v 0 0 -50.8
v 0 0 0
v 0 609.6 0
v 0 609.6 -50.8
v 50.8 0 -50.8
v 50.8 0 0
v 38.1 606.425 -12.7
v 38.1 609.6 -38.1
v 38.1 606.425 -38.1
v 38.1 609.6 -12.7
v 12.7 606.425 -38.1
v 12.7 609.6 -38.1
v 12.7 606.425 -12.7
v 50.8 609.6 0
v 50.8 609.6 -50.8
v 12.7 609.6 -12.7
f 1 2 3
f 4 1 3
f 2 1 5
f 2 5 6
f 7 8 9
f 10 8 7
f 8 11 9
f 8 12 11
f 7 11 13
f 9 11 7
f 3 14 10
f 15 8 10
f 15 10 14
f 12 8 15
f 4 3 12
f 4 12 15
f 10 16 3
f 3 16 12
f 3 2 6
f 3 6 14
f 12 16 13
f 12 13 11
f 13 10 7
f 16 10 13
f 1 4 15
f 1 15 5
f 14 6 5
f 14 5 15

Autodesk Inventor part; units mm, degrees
ref_plane "YZ Plane" through (0, 0, 0) normal (1, 0, 0) x (0, 1, 0)
ref_plane "XZ Plane" through (0, 0, 0) normal (0, 1, 0) x (-1, 0, 0)
ref_plane "XY Plane" through (0, 0, 0) normal (0, 0, 1) x (1, 0, 0)
sketch "Sketch1" plane through (0, 0, 0) normal (1, 0, 0) x (0, 1, 0)
  line L0 (0, 0) -> (609.6, 0)
  line L1 (609.6, 0) -> (609.6, -50.8)
  line L2 (609.6, -50.8) -> (0, -50.8)
  line L3 (0, -50.8) -> (0, 0)
  dimension "d0" = 609.6
  dimension "d1" = 50.8
extrude "Extrusion1" add sketch "Sketch1" along normal blind 50.8
sketch "Sketch2" plane through (0, 609.6, 0) normal (0, 1, 0) x (1, 0, 0)
  line L0 (12.7, 38.1) -> (38.1, 38.1)
  line L1 (38.1, 38.1) -> (38.1, 12.7)
  line L2 (38.1, 12.7) -> (12.7, 12.7)
  line L3 (12.7, 12.7) -> (12.7, 38.1)
  line L4 (0, 0) -> (0, 50.8) projected
  line L5 (0, 50.8) -> (50.8, 50.8) projected
  dimension "d4" = 25.4
  dimension "d5" = 25.4
  dimension "d6" = 12.7
  dimension "d7" = 12.7
extrude "Extrusion2" cut sketch "Sketch2" against normal blind 3.175
properties part number "LegStandard" material "Wood (Birch)"
